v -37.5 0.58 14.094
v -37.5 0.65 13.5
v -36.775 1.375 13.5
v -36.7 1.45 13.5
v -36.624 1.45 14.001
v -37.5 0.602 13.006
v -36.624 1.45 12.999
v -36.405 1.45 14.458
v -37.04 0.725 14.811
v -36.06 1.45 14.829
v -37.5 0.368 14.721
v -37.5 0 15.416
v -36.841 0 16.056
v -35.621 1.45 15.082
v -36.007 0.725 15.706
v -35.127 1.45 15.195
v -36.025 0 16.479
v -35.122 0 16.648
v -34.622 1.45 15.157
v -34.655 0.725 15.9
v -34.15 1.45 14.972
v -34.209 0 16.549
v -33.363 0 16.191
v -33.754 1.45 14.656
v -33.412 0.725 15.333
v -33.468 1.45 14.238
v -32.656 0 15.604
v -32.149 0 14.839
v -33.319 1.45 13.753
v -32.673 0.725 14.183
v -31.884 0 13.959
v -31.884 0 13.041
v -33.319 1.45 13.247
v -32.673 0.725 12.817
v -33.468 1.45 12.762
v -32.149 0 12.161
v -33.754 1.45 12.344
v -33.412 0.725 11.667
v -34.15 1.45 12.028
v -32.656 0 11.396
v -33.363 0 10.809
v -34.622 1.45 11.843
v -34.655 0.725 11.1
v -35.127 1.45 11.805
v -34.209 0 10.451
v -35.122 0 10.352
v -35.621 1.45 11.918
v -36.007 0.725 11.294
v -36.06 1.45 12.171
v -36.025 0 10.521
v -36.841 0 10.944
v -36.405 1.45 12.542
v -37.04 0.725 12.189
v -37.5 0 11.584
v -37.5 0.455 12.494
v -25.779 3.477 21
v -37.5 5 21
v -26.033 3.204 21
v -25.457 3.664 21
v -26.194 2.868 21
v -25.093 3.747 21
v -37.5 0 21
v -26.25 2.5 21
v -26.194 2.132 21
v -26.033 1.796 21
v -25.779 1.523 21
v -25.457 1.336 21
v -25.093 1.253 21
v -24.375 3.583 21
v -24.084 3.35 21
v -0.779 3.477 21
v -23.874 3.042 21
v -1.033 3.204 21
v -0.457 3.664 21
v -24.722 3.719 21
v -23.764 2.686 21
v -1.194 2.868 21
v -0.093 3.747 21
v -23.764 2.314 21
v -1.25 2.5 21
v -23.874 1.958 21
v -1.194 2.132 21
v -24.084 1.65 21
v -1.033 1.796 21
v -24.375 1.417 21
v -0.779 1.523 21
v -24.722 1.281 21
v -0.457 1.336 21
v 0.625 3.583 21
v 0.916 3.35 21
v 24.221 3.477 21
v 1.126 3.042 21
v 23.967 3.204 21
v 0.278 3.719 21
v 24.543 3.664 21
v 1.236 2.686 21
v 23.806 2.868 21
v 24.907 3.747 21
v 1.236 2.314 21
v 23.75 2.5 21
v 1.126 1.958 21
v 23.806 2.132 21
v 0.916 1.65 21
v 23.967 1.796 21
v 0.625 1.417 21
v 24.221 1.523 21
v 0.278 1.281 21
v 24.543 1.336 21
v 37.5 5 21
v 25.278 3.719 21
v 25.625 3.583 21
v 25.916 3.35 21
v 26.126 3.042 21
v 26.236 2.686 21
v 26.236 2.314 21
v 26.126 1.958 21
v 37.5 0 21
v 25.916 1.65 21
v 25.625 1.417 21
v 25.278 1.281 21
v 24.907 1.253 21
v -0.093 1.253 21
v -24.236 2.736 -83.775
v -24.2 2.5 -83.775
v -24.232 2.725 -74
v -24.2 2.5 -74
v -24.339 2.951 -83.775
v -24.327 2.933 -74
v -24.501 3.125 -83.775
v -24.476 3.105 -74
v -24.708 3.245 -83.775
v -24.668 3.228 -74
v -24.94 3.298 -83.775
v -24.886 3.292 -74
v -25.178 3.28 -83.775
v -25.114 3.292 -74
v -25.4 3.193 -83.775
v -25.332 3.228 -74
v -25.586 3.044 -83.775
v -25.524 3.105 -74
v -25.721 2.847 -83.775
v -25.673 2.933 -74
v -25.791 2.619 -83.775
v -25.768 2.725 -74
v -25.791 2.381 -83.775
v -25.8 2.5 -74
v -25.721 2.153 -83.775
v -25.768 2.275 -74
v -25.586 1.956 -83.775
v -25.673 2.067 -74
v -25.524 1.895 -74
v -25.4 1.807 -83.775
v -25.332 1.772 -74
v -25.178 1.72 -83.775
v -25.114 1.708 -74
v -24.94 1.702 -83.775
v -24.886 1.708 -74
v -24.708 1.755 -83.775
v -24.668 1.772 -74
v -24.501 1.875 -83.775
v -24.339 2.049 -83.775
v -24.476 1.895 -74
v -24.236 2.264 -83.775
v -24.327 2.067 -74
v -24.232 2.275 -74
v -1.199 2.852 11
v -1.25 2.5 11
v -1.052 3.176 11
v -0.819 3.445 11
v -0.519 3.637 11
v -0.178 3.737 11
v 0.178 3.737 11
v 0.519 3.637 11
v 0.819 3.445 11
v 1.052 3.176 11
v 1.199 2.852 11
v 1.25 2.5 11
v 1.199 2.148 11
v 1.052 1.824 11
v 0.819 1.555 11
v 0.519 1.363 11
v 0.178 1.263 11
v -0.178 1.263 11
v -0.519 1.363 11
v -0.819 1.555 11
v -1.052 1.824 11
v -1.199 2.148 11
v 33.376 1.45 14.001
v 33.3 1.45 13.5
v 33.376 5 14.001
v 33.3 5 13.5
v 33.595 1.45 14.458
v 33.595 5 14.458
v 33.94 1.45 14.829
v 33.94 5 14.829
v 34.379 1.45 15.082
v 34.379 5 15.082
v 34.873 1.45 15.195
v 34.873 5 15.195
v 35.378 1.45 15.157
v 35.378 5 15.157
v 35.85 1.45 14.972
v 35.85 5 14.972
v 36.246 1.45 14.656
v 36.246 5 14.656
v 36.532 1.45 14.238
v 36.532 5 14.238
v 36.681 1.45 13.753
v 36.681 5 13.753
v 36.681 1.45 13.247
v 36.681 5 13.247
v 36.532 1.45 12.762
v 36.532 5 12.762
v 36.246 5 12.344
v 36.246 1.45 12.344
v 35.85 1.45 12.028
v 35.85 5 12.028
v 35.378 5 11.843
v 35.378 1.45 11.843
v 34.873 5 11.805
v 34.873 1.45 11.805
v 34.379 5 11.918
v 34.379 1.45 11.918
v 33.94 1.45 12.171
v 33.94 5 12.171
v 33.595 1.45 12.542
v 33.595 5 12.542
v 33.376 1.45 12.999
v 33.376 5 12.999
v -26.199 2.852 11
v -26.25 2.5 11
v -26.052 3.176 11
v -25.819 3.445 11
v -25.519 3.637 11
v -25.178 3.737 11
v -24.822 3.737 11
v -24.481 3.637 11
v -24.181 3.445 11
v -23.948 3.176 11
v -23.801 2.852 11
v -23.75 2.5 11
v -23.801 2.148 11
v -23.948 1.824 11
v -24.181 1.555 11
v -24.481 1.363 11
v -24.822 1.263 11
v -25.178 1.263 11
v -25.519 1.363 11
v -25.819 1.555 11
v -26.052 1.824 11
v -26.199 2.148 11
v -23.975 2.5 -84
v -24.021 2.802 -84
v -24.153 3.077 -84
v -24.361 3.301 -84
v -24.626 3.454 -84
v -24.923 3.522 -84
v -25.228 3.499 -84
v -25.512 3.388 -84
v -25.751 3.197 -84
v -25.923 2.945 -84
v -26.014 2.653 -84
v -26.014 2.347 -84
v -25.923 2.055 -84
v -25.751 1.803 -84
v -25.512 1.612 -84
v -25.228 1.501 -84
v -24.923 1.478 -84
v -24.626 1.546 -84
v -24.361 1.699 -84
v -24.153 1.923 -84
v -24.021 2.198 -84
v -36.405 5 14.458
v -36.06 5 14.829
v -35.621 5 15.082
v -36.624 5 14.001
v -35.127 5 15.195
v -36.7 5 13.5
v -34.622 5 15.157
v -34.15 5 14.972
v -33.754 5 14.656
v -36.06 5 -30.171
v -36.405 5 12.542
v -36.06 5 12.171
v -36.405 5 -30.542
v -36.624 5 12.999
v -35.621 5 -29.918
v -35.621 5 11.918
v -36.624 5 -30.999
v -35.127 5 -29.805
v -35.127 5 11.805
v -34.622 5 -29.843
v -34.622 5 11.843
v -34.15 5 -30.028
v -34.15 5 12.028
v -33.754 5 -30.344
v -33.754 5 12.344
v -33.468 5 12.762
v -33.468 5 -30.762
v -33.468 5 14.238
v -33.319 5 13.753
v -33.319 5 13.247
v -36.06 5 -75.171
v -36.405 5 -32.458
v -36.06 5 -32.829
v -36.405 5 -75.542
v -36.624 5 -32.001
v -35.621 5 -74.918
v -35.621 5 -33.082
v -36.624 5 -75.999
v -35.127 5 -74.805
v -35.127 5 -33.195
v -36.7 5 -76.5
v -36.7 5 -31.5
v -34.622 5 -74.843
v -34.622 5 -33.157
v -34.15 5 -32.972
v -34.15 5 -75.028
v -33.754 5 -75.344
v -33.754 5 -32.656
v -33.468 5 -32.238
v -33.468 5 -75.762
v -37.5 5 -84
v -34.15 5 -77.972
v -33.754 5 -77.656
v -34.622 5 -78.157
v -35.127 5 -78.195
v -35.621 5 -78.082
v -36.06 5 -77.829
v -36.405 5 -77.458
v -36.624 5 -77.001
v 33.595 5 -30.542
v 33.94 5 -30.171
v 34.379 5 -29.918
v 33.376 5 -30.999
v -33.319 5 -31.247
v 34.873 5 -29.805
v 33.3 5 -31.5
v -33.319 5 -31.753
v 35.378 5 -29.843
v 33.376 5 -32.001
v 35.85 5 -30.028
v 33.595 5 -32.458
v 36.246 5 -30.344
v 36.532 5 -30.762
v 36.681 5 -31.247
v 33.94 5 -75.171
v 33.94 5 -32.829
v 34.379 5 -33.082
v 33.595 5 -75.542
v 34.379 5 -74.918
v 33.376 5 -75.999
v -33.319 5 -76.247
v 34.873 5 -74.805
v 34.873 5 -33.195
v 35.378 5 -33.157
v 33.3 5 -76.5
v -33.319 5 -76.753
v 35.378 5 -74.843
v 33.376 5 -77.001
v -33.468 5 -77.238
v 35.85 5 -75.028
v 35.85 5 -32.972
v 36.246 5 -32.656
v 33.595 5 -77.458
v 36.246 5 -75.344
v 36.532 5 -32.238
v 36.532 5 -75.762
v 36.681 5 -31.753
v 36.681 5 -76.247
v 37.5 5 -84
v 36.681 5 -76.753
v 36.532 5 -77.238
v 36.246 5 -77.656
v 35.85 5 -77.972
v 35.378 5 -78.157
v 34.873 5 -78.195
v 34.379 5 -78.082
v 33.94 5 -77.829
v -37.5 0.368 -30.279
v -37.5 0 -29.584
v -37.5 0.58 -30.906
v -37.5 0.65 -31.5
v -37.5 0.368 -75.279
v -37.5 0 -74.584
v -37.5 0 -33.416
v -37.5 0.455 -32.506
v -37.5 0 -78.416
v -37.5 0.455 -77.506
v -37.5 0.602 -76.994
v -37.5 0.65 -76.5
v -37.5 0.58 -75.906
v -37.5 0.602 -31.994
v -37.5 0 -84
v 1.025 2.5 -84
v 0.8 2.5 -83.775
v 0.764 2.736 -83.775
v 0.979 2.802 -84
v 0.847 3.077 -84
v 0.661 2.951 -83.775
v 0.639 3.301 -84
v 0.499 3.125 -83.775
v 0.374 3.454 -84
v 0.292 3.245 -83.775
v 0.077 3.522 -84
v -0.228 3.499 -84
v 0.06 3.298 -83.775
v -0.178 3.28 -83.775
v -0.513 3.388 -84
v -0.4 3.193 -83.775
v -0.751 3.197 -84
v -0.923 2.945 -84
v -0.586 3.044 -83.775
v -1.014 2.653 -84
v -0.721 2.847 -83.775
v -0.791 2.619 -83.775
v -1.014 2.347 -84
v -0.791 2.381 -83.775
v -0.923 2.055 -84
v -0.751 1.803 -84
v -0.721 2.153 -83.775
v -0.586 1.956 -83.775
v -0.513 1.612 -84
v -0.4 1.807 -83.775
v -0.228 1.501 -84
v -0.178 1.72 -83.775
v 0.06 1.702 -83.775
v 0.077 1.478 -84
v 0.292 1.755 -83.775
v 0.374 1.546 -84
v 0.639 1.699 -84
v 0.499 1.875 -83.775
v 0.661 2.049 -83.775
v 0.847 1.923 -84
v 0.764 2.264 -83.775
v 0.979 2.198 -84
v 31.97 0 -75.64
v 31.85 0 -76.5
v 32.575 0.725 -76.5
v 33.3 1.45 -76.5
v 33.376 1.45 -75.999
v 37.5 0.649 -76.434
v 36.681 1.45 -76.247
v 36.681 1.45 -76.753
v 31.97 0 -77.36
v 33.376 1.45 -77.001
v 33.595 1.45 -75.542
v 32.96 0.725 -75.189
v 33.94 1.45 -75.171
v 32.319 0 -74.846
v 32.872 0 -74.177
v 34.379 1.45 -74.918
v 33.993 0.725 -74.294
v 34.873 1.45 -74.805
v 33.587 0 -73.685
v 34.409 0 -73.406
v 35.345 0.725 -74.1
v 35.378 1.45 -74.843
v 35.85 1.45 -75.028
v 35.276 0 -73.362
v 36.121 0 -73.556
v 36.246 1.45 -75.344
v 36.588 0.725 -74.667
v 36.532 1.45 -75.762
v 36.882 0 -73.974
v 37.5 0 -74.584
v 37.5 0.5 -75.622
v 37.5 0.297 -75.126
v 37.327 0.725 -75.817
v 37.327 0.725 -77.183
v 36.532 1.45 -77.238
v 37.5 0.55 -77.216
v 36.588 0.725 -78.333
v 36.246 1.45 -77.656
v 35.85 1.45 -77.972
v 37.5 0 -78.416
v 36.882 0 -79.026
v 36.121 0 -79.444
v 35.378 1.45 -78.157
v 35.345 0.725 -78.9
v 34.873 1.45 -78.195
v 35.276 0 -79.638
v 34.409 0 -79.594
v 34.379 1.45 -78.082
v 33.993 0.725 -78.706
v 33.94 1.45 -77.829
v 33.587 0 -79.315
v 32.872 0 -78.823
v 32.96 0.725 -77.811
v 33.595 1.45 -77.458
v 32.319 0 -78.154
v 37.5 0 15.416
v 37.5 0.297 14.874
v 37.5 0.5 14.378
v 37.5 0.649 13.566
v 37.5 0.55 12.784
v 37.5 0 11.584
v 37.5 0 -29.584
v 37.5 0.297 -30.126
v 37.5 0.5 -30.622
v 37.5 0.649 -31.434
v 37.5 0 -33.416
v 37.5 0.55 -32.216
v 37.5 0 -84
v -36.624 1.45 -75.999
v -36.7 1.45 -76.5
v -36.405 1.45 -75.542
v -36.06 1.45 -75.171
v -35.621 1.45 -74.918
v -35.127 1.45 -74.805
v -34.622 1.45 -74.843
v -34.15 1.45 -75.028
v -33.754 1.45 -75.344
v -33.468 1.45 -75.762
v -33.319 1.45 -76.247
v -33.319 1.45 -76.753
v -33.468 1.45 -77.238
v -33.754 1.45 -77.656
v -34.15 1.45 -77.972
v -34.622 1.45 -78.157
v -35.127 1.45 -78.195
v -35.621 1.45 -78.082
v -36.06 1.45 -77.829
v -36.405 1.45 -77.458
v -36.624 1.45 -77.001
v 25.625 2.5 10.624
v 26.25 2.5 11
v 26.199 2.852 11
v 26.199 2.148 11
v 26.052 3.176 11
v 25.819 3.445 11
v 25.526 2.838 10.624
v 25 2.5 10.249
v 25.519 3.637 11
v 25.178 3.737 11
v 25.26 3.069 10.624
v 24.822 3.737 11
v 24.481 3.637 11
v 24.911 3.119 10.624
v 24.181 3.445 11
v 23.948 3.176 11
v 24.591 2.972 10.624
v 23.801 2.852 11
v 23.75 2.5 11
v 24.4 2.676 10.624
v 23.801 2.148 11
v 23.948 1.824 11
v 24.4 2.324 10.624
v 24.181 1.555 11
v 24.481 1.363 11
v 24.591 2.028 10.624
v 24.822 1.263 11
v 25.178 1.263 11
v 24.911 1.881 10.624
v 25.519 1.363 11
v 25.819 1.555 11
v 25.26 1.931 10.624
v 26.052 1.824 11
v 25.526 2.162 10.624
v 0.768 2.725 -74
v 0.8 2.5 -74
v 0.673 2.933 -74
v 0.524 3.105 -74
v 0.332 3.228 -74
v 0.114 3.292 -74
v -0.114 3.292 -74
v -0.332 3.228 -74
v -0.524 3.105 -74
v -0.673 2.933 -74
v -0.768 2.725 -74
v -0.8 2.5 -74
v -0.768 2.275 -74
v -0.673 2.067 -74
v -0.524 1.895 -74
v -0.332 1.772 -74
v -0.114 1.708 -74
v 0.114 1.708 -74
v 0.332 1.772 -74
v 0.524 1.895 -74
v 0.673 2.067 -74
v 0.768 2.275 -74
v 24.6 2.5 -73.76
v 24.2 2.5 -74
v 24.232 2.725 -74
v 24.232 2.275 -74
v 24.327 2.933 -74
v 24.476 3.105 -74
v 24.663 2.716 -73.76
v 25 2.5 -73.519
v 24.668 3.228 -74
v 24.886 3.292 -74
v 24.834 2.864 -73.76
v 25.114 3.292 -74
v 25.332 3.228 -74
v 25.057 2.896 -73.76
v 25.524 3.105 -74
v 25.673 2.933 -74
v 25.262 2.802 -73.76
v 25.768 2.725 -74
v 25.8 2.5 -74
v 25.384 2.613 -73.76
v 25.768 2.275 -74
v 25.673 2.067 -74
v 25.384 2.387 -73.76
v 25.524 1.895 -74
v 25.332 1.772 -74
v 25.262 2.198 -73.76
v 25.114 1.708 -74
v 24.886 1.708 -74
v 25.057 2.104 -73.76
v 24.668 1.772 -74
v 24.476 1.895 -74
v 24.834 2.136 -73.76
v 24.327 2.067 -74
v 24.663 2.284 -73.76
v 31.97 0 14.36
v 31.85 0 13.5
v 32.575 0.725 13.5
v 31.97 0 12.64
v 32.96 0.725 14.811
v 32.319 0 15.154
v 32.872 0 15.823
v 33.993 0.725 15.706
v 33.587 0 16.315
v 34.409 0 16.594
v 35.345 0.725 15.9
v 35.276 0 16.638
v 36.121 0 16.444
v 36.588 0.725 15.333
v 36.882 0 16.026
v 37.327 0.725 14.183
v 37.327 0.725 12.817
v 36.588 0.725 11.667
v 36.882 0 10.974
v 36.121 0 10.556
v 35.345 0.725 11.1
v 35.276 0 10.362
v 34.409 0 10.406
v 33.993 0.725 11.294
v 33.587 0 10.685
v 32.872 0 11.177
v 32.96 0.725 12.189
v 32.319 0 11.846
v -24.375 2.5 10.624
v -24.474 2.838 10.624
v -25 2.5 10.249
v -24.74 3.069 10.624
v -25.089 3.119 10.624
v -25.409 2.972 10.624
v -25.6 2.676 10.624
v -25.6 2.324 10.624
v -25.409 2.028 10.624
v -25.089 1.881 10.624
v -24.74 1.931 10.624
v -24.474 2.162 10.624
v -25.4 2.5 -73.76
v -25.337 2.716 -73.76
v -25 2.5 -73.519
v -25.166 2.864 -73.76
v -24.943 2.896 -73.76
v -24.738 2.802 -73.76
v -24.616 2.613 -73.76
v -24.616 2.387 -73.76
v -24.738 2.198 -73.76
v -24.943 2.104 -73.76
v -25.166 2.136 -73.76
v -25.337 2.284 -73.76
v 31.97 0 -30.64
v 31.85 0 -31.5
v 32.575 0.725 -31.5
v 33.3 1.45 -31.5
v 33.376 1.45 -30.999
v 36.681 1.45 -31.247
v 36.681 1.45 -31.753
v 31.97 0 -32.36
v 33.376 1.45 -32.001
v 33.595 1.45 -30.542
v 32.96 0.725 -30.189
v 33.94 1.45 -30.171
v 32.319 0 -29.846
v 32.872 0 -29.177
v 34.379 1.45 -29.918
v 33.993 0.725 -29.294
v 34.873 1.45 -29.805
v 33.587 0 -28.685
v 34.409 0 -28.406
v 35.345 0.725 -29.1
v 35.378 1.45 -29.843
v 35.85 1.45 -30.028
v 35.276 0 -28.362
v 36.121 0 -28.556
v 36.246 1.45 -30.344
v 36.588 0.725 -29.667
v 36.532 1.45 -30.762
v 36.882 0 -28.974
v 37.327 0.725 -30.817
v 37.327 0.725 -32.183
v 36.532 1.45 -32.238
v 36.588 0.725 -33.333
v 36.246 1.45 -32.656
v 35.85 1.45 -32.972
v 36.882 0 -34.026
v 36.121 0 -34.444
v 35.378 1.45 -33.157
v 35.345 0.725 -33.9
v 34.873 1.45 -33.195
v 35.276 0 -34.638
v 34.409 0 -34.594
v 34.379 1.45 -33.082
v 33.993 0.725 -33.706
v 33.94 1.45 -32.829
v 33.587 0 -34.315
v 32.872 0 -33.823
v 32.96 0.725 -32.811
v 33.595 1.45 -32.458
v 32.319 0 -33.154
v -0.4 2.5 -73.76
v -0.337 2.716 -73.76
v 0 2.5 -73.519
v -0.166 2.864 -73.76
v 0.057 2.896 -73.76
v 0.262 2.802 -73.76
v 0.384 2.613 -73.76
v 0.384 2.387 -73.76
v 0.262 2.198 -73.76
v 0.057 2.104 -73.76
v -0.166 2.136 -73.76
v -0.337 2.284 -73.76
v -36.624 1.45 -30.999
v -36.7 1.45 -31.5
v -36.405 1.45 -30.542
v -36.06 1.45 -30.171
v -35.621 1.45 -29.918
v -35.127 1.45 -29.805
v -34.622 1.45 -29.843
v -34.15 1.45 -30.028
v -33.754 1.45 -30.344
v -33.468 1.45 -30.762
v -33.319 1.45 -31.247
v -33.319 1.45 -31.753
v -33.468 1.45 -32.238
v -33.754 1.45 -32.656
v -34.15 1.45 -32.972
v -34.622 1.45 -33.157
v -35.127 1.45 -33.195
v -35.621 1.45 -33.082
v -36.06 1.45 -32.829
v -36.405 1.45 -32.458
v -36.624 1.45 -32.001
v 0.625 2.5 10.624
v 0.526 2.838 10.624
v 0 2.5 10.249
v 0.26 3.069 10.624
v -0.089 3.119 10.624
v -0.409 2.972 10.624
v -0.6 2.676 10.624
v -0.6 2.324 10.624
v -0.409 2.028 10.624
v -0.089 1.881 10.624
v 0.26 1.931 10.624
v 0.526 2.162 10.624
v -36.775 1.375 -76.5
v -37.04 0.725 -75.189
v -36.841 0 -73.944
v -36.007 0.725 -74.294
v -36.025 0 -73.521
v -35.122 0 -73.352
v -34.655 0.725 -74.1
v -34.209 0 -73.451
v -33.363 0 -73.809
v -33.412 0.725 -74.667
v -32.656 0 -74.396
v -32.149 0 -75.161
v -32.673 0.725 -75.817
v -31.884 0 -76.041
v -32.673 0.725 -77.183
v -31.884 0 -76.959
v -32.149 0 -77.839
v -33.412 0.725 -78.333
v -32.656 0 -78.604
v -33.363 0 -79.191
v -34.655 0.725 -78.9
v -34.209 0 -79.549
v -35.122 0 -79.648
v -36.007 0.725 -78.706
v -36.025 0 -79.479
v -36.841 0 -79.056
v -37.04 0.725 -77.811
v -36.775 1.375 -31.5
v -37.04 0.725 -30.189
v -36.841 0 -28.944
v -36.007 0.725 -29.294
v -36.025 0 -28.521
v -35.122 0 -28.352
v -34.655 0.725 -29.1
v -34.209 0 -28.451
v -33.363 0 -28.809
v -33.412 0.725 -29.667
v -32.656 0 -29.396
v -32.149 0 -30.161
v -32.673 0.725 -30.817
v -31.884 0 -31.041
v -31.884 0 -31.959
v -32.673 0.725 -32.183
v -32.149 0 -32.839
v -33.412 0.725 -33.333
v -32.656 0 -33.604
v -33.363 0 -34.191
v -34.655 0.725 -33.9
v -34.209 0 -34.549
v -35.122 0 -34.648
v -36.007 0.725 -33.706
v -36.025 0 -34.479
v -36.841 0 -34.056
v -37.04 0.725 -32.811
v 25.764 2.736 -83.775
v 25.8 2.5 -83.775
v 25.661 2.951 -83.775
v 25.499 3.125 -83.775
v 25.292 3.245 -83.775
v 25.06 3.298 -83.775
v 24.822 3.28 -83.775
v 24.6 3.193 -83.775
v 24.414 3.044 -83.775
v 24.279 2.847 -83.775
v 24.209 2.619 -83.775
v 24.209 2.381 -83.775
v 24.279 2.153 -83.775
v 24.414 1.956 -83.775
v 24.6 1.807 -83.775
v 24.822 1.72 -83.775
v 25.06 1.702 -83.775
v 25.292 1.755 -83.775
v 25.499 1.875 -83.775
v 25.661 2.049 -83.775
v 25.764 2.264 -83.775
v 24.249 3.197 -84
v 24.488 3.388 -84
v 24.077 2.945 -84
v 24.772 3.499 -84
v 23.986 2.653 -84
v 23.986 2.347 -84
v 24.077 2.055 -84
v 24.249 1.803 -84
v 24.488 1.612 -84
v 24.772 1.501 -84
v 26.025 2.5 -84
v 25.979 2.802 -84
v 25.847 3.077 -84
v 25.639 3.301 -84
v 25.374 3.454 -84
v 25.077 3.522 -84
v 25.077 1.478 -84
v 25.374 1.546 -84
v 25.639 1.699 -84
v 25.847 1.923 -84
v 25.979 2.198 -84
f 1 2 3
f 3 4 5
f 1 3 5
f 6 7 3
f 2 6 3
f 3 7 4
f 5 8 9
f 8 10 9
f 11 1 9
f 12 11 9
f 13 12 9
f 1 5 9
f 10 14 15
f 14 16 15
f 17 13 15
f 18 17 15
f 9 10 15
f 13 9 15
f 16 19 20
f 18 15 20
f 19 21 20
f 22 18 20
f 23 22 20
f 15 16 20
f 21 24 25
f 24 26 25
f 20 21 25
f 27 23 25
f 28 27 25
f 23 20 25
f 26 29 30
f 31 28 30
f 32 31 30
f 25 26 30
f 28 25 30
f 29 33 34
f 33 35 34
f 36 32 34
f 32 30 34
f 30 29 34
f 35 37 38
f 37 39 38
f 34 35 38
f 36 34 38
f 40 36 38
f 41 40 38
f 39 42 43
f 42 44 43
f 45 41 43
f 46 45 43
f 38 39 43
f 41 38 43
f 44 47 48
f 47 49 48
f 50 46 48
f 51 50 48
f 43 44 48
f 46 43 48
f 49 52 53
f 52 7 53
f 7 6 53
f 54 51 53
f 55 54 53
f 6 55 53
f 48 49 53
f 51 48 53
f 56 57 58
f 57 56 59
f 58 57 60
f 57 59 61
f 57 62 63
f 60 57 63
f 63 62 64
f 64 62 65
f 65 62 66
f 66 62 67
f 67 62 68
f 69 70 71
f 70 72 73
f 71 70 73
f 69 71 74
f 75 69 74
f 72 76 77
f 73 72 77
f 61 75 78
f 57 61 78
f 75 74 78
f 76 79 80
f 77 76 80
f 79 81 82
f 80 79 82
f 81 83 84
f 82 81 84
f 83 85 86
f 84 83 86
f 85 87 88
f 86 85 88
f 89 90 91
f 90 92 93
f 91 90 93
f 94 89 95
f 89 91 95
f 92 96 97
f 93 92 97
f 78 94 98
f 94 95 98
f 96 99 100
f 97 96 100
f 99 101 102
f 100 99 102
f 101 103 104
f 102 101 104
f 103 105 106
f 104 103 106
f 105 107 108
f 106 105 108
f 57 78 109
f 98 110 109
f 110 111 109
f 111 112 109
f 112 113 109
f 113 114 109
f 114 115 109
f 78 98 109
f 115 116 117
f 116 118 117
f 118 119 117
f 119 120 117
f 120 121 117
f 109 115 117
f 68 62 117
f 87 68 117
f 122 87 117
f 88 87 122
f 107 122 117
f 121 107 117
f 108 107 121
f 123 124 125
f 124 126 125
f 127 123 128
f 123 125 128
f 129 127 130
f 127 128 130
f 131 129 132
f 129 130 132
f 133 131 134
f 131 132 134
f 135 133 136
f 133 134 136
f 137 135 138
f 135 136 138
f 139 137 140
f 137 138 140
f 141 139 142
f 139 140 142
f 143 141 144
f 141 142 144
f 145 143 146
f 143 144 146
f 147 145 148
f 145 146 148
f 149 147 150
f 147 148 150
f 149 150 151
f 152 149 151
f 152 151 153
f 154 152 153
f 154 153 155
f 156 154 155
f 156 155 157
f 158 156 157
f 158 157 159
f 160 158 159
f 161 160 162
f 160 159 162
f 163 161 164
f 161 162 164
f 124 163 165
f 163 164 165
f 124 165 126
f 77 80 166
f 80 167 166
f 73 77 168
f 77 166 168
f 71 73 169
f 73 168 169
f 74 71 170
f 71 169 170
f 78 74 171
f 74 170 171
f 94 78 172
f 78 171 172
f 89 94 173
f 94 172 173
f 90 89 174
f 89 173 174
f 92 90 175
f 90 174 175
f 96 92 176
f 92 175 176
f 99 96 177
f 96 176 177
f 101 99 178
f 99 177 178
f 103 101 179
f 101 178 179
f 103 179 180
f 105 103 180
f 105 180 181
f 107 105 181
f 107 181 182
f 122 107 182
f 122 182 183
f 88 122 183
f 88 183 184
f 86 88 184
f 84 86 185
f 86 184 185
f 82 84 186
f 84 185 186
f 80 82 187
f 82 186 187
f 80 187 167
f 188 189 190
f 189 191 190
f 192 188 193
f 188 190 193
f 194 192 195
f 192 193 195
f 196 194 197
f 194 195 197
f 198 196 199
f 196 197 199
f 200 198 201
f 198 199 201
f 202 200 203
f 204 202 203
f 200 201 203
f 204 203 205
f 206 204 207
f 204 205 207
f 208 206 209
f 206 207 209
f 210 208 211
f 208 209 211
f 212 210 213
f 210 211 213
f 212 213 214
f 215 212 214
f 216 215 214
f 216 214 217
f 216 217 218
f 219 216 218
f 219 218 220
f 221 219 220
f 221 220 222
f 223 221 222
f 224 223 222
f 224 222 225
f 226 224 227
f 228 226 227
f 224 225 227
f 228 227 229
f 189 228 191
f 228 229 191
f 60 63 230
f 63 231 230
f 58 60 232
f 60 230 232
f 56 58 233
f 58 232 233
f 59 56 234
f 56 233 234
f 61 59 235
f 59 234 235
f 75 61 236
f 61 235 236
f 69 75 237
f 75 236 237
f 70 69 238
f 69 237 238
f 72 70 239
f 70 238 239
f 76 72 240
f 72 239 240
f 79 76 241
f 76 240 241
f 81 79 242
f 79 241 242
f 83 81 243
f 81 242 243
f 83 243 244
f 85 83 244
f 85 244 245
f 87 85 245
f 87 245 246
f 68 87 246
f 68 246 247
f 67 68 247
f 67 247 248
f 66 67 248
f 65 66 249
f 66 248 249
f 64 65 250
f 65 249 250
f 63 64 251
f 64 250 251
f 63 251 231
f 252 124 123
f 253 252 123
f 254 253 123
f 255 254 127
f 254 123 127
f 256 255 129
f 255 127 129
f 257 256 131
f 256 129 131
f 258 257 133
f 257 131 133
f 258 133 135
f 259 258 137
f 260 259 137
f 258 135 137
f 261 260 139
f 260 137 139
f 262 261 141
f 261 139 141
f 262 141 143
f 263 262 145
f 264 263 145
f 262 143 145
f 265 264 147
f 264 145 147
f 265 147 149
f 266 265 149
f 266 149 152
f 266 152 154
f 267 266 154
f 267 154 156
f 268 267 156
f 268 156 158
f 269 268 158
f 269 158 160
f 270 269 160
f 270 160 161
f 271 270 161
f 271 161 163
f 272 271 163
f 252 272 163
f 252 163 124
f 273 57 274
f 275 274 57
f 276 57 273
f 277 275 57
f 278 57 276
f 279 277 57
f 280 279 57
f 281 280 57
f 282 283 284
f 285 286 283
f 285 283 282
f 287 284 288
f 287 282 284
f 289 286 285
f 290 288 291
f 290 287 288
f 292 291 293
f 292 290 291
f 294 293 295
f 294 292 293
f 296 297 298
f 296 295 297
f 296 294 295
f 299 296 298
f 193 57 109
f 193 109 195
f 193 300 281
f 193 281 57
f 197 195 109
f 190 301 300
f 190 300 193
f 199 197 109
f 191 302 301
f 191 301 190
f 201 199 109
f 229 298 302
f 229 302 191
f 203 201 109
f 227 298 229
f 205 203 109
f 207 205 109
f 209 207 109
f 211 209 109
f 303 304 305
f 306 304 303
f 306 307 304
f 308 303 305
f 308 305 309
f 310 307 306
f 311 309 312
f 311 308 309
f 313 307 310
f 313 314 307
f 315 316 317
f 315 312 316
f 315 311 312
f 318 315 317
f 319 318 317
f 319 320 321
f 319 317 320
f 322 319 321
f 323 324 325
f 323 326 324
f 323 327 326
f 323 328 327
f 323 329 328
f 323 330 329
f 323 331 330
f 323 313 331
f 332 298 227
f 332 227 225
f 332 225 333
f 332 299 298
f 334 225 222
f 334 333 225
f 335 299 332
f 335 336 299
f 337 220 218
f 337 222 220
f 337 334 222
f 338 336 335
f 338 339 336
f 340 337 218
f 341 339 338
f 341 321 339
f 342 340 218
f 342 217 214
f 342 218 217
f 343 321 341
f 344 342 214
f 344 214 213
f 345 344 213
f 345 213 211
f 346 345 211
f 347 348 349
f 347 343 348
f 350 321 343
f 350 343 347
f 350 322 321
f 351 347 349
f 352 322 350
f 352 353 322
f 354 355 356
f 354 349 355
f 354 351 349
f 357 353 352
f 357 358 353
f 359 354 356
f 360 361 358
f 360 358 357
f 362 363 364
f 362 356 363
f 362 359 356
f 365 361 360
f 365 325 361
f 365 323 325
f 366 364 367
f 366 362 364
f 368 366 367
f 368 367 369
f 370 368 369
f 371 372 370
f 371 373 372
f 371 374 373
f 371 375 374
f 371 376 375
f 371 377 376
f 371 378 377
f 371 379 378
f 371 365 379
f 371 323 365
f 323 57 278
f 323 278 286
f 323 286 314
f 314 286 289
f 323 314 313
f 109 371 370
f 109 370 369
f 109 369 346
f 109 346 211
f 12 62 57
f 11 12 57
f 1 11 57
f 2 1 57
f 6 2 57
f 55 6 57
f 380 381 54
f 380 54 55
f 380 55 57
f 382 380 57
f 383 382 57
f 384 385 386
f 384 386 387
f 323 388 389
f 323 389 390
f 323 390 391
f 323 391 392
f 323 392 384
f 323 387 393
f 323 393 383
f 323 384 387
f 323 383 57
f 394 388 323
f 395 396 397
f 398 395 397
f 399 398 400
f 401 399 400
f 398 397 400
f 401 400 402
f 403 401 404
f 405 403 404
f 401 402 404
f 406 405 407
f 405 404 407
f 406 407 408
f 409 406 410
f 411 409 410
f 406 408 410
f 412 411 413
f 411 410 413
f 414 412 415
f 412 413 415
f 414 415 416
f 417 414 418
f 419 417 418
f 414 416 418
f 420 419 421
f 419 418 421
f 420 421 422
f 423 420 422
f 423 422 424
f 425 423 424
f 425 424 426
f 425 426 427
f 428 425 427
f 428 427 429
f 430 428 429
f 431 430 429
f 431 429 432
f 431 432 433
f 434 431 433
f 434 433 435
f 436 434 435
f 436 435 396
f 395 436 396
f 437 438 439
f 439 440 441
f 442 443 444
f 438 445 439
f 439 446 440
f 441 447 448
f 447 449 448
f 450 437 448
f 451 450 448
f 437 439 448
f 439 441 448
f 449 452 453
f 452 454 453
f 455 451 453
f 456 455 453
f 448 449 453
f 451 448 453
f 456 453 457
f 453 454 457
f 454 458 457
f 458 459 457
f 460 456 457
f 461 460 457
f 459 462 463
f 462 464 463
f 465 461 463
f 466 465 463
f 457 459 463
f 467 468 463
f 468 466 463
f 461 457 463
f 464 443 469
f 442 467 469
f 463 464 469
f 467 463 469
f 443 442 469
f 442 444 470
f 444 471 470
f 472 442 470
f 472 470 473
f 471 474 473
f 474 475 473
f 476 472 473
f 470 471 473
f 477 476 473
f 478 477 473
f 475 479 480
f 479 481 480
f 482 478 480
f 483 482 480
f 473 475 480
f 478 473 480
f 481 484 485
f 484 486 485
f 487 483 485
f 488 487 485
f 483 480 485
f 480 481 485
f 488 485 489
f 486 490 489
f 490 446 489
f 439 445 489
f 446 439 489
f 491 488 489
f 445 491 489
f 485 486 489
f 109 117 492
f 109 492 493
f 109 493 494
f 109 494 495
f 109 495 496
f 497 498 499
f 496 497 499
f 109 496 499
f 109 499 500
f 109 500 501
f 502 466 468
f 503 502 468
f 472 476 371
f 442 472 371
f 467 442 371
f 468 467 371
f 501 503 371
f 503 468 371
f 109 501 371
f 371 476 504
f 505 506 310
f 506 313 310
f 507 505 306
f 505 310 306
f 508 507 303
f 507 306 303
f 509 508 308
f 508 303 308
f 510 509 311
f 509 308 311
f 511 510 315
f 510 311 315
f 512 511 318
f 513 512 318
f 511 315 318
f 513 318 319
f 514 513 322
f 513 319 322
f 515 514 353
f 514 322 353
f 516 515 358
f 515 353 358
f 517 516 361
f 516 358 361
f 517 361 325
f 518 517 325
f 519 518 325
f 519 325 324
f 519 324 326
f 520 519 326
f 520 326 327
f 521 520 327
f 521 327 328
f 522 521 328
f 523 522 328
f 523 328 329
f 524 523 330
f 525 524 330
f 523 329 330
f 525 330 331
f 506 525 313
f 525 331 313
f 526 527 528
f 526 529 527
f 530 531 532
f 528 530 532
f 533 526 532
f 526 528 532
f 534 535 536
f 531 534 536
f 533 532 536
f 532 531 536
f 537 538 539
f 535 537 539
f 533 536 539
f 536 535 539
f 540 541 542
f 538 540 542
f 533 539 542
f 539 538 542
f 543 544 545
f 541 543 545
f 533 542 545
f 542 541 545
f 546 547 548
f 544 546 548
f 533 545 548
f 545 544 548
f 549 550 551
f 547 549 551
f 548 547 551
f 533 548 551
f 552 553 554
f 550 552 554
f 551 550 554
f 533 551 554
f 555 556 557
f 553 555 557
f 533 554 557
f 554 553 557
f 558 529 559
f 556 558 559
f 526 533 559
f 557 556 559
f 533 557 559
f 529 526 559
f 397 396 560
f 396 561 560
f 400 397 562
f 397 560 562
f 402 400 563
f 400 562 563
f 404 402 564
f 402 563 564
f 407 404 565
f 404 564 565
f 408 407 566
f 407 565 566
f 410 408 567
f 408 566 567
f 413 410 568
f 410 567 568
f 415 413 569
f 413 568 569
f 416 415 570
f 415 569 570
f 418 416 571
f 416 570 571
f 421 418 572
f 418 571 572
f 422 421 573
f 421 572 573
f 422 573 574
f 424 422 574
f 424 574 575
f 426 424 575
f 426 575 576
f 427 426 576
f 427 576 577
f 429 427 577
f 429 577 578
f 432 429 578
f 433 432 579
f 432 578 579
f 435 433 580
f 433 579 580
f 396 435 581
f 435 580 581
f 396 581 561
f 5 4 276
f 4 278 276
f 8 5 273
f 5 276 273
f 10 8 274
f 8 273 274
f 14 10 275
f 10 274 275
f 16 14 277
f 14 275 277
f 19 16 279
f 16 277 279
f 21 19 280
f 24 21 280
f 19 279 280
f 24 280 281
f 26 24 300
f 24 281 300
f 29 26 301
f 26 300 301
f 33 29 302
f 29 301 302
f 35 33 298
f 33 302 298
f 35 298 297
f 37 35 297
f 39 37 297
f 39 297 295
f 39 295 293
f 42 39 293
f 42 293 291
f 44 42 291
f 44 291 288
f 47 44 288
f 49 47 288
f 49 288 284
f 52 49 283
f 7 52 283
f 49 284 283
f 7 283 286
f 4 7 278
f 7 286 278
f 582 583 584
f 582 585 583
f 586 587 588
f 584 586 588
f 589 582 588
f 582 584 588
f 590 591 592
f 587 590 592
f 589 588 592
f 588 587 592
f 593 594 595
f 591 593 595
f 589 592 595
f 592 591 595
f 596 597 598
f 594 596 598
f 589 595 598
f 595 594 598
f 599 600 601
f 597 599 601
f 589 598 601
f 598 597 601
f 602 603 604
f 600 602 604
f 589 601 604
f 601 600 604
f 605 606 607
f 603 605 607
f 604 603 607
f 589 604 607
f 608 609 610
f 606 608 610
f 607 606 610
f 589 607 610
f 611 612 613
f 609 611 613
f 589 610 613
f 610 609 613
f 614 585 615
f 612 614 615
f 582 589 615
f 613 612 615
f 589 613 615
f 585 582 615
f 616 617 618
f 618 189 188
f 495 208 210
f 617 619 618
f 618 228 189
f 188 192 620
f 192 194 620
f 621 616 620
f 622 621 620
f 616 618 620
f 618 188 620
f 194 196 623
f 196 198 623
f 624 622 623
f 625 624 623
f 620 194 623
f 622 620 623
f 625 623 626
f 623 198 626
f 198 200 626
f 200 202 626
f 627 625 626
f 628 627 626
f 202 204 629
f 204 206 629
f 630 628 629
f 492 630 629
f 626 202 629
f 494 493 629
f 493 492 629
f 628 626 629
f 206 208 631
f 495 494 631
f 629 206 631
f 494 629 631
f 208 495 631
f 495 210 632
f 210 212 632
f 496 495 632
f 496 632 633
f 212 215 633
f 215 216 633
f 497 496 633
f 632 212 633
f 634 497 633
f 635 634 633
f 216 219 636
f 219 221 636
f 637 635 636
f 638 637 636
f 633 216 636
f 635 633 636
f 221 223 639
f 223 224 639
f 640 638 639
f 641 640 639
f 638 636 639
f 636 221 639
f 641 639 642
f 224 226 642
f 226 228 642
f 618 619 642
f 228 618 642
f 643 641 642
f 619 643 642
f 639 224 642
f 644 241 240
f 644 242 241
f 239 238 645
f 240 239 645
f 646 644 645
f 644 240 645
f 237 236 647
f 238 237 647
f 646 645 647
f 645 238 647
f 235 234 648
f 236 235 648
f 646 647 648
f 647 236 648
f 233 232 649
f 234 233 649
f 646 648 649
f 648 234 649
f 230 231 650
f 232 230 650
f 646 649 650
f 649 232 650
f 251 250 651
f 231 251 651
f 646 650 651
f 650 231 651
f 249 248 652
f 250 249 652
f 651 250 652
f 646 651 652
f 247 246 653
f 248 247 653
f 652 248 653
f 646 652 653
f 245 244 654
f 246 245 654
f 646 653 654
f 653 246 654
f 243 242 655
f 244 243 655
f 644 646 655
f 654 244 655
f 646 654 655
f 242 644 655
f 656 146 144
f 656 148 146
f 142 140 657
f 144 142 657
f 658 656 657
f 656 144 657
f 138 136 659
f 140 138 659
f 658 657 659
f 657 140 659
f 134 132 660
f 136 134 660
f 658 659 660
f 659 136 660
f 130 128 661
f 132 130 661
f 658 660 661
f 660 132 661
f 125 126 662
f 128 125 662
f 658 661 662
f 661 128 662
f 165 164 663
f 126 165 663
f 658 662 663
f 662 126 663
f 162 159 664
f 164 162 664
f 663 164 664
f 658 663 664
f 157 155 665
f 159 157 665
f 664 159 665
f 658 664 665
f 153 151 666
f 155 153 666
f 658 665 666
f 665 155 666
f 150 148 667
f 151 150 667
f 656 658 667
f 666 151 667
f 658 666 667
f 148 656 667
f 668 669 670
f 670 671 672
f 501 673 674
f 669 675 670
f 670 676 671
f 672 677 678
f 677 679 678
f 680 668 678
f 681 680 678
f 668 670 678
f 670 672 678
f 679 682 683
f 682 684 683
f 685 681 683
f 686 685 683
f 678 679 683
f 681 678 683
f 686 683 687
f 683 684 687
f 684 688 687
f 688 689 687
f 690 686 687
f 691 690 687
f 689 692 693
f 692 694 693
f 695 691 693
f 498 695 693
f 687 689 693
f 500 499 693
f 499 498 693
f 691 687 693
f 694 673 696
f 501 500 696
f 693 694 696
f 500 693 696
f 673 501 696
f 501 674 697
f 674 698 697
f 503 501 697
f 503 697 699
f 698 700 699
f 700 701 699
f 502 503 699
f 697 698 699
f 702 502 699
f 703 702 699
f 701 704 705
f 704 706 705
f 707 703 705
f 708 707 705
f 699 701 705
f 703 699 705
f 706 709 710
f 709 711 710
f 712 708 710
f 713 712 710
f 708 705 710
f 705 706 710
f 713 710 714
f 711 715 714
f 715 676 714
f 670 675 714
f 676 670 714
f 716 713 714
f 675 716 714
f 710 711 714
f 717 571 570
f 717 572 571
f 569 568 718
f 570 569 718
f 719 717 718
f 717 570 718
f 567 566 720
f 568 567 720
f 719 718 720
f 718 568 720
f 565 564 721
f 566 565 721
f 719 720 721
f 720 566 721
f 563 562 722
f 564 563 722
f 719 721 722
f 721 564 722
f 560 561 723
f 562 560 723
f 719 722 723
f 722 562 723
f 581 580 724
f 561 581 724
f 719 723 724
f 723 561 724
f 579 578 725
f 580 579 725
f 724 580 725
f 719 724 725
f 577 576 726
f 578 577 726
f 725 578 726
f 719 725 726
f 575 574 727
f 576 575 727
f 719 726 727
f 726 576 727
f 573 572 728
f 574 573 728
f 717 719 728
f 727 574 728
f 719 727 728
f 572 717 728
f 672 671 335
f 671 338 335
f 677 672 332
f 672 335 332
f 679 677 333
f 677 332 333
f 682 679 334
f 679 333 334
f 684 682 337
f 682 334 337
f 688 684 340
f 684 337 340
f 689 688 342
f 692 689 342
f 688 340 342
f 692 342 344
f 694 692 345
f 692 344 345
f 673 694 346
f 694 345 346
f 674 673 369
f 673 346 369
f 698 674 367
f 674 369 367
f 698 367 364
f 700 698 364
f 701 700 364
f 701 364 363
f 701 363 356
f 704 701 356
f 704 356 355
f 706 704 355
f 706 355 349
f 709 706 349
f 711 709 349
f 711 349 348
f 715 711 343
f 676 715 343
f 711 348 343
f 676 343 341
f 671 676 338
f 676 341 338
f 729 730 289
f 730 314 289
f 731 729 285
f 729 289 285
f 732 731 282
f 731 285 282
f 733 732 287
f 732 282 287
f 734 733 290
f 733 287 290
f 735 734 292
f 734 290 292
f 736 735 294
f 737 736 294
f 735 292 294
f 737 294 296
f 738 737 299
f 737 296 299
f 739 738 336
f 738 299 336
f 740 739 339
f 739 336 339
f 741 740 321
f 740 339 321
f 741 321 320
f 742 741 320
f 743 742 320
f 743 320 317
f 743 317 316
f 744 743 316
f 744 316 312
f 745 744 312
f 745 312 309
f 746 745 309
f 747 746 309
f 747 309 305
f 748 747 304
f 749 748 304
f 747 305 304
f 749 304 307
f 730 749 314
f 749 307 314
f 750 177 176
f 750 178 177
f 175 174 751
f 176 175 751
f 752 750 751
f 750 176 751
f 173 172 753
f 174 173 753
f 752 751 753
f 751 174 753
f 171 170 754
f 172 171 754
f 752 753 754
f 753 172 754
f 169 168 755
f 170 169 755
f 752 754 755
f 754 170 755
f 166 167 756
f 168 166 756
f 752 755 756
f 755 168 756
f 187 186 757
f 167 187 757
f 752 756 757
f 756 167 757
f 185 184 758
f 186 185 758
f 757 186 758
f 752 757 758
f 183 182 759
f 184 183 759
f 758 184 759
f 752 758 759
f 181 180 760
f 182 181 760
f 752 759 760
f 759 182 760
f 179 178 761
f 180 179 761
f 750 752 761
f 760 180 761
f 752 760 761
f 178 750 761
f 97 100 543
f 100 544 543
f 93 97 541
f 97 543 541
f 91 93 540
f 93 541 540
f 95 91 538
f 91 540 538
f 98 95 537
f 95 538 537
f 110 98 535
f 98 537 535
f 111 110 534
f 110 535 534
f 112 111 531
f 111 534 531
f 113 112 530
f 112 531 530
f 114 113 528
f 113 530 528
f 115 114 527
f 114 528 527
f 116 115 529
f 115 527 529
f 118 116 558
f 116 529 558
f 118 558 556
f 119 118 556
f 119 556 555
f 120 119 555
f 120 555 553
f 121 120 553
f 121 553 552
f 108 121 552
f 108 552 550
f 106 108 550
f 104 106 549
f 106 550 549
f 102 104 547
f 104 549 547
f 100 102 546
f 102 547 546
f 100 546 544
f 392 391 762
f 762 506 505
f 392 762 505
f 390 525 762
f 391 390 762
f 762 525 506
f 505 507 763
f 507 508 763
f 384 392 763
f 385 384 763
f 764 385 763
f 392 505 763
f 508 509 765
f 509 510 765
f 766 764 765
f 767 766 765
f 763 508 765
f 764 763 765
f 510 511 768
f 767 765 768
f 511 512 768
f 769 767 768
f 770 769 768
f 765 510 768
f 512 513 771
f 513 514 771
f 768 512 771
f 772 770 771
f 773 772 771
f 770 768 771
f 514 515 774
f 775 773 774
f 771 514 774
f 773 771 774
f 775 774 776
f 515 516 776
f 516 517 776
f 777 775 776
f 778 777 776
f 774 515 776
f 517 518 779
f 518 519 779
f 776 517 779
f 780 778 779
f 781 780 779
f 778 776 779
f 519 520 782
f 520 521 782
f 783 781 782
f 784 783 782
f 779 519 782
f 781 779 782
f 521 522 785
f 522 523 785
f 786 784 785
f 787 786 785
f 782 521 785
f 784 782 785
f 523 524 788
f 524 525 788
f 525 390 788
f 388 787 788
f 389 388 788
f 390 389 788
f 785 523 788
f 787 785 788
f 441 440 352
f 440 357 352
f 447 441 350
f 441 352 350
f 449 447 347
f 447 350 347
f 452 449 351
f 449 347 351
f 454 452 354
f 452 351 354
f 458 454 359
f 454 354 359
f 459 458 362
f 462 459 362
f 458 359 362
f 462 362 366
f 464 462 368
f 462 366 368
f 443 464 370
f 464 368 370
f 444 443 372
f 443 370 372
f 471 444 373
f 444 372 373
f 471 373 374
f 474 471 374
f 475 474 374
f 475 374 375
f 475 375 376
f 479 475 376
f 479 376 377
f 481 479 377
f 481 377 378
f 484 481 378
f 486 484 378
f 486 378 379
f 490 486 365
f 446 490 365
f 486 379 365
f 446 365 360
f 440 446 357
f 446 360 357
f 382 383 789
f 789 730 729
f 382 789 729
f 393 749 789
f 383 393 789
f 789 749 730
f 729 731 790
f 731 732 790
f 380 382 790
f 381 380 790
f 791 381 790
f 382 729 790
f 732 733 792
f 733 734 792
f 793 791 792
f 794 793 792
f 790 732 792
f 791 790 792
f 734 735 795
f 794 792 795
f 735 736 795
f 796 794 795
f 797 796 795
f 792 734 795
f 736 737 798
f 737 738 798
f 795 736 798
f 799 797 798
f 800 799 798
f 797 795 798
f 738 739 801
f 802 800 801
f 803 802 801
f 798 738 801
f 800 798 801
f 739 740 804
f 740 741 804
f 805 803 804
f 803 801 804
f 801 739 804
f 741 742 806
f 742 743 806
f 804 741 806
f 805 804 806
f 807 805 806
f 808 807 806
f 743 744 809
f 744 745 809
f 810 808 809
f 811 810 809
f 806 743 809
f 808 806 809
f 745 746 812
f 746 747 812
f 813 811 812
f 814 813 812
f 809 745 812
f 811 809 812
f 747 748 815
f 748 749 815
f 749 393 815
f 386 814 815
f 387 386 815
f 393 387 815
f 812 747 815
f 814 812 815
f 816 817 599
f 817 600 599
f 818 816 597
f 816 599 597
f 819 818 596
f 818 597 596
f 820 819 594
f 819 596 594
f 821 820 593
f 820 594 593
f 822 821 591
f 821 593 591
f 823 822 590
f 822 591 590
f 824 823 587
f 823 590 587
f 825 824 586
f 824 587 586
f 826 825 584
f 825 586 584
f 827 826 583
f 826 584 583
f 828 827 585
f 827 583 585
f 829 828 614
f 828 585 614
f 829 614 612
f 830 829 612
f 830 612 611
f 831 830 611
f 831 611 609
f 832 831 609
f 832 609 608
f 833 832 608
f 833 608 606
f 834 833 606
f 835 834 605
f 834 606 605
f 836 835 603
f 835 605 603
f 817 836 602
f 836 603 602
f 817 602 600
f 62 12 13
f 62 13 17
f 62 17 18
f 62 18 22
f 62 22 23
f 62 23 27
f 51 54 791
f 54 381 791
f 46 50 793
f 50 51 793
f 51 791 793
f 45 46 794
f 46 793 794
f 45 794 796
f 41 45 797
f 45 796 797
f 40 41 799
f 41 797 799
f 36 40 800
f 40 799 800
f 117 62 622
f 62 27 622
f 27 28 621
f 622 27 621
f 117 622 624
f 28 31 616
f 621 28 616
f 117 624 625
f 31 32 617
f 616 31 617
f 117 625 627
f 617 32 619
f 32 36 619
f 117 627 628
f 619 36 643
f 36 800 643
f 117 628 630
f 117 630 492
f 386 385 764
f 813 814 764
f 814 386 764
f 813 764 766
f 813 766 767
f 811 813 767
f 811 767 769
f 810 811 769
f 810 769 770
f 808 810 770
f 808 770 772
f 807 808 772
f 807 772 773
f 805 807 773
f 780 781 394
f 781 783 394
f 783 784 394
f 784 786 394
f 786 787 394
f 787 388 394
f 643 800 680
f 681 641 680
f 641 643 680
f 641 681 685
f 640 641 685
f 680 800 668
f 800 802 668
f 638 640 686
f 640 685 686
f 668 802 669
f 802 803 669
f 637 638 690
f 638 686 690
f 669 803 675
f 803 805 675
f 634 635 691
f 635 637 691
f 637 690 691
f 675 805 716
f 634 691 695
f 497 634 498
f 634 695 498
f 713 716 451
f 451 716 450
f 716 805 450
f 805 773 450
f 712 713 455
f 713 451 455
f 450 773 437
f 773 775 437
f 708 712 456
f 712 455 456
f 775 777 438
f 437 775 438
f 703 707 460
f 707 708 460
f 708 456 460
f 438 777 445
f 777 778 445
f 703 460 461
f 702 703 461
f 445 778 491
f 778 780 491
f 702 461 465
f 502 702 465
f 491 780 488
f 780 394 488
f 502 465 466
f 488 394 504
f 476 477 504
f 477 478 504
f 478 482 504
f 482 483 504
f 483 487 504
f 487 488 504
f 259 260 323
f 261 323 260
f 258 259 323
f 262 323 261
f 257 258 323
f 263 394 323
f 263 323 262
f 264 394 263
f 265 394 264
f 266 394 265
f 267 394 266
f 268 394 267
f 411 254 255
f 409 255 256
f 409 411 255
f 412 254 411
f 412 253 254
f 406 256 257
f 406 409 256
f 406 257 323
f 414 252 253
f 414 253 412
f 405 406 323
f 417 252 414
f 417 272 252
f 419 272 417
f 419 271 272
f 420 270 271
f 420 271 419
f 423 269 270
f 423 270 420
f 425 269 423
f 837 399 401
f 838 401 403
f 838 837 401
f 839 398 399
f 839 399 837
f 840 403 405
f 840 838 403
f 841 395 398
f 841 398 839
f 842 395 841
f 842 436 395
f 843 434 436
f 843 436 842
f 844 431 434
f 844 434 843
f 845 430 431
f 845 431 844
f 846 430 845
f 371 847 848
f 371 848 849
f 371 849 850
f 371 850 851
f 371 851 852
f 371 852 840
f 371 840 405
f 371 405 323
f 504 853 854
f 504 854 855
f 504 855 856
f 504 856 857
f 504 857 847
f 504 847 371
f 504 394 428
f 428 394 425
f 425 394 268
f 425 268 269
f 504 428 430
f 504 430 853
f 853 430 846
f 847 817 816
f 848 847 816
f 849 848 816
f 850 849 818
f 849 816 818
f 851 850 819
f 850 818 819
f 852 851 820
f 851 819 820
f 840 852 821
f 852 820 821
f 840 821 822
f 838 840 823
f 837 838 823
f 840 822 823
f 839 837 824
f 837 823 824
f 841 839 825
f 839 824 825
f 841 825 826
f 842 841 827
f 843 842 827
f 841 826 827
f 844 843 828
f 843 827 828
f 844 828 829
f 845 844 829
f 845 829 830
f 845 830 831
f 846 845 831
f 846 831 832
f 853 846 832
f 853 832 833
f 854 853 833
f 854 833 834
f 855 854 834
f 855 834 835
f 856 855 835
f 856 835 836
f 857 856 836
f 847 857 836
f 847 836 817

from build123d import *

# Parameters (mm, degrees)
SKETCH_1_W                   = 75
SKETCH_1_H                   = 105
EXTRUDE_432_DEPTH            = 5
HOLE_WIZARD_M3_D             = 2.5
HOLE_WIZARD_M3_DEPTH         = 10
HOLE_WIZARD_M3_TIP           = 0.751075774
HOLE_WIZARD_M3_2_D           = 1.6
HOLE_WIZARD_M3_2_DEPTH       = 10
HOLE_WIZARD_M3_2_CSINK_D     = 2.05
HOLE_WIZARD_M3_2_CSINK_ANGLE = 90
HOLE_WIZARD_M3_2_TIP         = 0.480688495
HOLE_WIZARD_M3_3_D           = 3.4
HOLE_WIZARD_M3_3_CSINK_D     = 6.3
HOLE_WIZARD_M3_3_CSINK_ANGLE = 90


with BuildPart() as part:
    # Эскиз1 → Extrude 432 (new body)
    with BuildSketch(Plane(origin=(0, 0, 0), x_dir=(1, 0, 0), z_dir=(0, 1, 0))):
        with Locations((0, 31.5)):
            Rectangle(SKETCH_1_W, SKETCH_1_H)
    extrude(amount=EXTRUDE_432_DEPTH)

    # Hole Wizard M3
    with Locations(Plane.XY.offset(21)):
        with Locations((-25, 2.5), (0, 2.5), (25, 2.5)):
            Hole(HOLE_WIZARD_M3_D / 2, depth=HOLE_WIZARD_M3_DEPTH)
            with Locations((0, 0, -(HOLE_WIZARD_M3_DEPTH + HOLE_WIZARD_M3_TIP / 2))):  # 118° drill point
                Cone(0, HOLE_WIZARD_M3_D / 2, HOLE_WIZARD_M3_TIP, mode=Mode.SUBTRACT)

    # Hole Wizard M3 2
    with Locations(Plane(origin=(0, 0, -84), x_dir=(-1, 0, 0), z_dir=(0, 0, -1))):
        with Locations((-25, 2.5), (0, 2.5), (25, 2.5)):
            CounterSinkHole(HOLE_WIZARD_M3_2_D / 2, HOLE_WIZARD_M3_2_CSINK_D / 2, depth=HOLE_WIZARD_M3_2_DEPTH, counter_sink_angle=HOLE_WIZARD_M3_2_CSINK_ANGLE)
            with Locations((0, 0, -(HOLE_WIZARD_M3_2_DEPTH + HOLE_WIZARD_M3_2_TIP / 2))):  # 118° drill point
                Cone(0, HOLE_WIZARD_M3_2_D / 2, HOLE_WIZARD_M3_2_TIP, mode=Mode.SUBTRACT)

    # Hole Wizard M3 3 (through all)
    with Locations(Plane.XZ):
        with Locations((-35, -31.5), (35, -31.5), (35, -76.5), (35, 13.5), (-35, 13.5), (-35, -76.5)):
            CounterSinkHole(HOLE_WIZARD_M3_3_D / 2, HOLE_WIZARD_M3_3_CSINK_D / 2, counter_sink_angle=HOLE_WIZARD_M3_3_CSINK_ANGLE)


solid = part.part
